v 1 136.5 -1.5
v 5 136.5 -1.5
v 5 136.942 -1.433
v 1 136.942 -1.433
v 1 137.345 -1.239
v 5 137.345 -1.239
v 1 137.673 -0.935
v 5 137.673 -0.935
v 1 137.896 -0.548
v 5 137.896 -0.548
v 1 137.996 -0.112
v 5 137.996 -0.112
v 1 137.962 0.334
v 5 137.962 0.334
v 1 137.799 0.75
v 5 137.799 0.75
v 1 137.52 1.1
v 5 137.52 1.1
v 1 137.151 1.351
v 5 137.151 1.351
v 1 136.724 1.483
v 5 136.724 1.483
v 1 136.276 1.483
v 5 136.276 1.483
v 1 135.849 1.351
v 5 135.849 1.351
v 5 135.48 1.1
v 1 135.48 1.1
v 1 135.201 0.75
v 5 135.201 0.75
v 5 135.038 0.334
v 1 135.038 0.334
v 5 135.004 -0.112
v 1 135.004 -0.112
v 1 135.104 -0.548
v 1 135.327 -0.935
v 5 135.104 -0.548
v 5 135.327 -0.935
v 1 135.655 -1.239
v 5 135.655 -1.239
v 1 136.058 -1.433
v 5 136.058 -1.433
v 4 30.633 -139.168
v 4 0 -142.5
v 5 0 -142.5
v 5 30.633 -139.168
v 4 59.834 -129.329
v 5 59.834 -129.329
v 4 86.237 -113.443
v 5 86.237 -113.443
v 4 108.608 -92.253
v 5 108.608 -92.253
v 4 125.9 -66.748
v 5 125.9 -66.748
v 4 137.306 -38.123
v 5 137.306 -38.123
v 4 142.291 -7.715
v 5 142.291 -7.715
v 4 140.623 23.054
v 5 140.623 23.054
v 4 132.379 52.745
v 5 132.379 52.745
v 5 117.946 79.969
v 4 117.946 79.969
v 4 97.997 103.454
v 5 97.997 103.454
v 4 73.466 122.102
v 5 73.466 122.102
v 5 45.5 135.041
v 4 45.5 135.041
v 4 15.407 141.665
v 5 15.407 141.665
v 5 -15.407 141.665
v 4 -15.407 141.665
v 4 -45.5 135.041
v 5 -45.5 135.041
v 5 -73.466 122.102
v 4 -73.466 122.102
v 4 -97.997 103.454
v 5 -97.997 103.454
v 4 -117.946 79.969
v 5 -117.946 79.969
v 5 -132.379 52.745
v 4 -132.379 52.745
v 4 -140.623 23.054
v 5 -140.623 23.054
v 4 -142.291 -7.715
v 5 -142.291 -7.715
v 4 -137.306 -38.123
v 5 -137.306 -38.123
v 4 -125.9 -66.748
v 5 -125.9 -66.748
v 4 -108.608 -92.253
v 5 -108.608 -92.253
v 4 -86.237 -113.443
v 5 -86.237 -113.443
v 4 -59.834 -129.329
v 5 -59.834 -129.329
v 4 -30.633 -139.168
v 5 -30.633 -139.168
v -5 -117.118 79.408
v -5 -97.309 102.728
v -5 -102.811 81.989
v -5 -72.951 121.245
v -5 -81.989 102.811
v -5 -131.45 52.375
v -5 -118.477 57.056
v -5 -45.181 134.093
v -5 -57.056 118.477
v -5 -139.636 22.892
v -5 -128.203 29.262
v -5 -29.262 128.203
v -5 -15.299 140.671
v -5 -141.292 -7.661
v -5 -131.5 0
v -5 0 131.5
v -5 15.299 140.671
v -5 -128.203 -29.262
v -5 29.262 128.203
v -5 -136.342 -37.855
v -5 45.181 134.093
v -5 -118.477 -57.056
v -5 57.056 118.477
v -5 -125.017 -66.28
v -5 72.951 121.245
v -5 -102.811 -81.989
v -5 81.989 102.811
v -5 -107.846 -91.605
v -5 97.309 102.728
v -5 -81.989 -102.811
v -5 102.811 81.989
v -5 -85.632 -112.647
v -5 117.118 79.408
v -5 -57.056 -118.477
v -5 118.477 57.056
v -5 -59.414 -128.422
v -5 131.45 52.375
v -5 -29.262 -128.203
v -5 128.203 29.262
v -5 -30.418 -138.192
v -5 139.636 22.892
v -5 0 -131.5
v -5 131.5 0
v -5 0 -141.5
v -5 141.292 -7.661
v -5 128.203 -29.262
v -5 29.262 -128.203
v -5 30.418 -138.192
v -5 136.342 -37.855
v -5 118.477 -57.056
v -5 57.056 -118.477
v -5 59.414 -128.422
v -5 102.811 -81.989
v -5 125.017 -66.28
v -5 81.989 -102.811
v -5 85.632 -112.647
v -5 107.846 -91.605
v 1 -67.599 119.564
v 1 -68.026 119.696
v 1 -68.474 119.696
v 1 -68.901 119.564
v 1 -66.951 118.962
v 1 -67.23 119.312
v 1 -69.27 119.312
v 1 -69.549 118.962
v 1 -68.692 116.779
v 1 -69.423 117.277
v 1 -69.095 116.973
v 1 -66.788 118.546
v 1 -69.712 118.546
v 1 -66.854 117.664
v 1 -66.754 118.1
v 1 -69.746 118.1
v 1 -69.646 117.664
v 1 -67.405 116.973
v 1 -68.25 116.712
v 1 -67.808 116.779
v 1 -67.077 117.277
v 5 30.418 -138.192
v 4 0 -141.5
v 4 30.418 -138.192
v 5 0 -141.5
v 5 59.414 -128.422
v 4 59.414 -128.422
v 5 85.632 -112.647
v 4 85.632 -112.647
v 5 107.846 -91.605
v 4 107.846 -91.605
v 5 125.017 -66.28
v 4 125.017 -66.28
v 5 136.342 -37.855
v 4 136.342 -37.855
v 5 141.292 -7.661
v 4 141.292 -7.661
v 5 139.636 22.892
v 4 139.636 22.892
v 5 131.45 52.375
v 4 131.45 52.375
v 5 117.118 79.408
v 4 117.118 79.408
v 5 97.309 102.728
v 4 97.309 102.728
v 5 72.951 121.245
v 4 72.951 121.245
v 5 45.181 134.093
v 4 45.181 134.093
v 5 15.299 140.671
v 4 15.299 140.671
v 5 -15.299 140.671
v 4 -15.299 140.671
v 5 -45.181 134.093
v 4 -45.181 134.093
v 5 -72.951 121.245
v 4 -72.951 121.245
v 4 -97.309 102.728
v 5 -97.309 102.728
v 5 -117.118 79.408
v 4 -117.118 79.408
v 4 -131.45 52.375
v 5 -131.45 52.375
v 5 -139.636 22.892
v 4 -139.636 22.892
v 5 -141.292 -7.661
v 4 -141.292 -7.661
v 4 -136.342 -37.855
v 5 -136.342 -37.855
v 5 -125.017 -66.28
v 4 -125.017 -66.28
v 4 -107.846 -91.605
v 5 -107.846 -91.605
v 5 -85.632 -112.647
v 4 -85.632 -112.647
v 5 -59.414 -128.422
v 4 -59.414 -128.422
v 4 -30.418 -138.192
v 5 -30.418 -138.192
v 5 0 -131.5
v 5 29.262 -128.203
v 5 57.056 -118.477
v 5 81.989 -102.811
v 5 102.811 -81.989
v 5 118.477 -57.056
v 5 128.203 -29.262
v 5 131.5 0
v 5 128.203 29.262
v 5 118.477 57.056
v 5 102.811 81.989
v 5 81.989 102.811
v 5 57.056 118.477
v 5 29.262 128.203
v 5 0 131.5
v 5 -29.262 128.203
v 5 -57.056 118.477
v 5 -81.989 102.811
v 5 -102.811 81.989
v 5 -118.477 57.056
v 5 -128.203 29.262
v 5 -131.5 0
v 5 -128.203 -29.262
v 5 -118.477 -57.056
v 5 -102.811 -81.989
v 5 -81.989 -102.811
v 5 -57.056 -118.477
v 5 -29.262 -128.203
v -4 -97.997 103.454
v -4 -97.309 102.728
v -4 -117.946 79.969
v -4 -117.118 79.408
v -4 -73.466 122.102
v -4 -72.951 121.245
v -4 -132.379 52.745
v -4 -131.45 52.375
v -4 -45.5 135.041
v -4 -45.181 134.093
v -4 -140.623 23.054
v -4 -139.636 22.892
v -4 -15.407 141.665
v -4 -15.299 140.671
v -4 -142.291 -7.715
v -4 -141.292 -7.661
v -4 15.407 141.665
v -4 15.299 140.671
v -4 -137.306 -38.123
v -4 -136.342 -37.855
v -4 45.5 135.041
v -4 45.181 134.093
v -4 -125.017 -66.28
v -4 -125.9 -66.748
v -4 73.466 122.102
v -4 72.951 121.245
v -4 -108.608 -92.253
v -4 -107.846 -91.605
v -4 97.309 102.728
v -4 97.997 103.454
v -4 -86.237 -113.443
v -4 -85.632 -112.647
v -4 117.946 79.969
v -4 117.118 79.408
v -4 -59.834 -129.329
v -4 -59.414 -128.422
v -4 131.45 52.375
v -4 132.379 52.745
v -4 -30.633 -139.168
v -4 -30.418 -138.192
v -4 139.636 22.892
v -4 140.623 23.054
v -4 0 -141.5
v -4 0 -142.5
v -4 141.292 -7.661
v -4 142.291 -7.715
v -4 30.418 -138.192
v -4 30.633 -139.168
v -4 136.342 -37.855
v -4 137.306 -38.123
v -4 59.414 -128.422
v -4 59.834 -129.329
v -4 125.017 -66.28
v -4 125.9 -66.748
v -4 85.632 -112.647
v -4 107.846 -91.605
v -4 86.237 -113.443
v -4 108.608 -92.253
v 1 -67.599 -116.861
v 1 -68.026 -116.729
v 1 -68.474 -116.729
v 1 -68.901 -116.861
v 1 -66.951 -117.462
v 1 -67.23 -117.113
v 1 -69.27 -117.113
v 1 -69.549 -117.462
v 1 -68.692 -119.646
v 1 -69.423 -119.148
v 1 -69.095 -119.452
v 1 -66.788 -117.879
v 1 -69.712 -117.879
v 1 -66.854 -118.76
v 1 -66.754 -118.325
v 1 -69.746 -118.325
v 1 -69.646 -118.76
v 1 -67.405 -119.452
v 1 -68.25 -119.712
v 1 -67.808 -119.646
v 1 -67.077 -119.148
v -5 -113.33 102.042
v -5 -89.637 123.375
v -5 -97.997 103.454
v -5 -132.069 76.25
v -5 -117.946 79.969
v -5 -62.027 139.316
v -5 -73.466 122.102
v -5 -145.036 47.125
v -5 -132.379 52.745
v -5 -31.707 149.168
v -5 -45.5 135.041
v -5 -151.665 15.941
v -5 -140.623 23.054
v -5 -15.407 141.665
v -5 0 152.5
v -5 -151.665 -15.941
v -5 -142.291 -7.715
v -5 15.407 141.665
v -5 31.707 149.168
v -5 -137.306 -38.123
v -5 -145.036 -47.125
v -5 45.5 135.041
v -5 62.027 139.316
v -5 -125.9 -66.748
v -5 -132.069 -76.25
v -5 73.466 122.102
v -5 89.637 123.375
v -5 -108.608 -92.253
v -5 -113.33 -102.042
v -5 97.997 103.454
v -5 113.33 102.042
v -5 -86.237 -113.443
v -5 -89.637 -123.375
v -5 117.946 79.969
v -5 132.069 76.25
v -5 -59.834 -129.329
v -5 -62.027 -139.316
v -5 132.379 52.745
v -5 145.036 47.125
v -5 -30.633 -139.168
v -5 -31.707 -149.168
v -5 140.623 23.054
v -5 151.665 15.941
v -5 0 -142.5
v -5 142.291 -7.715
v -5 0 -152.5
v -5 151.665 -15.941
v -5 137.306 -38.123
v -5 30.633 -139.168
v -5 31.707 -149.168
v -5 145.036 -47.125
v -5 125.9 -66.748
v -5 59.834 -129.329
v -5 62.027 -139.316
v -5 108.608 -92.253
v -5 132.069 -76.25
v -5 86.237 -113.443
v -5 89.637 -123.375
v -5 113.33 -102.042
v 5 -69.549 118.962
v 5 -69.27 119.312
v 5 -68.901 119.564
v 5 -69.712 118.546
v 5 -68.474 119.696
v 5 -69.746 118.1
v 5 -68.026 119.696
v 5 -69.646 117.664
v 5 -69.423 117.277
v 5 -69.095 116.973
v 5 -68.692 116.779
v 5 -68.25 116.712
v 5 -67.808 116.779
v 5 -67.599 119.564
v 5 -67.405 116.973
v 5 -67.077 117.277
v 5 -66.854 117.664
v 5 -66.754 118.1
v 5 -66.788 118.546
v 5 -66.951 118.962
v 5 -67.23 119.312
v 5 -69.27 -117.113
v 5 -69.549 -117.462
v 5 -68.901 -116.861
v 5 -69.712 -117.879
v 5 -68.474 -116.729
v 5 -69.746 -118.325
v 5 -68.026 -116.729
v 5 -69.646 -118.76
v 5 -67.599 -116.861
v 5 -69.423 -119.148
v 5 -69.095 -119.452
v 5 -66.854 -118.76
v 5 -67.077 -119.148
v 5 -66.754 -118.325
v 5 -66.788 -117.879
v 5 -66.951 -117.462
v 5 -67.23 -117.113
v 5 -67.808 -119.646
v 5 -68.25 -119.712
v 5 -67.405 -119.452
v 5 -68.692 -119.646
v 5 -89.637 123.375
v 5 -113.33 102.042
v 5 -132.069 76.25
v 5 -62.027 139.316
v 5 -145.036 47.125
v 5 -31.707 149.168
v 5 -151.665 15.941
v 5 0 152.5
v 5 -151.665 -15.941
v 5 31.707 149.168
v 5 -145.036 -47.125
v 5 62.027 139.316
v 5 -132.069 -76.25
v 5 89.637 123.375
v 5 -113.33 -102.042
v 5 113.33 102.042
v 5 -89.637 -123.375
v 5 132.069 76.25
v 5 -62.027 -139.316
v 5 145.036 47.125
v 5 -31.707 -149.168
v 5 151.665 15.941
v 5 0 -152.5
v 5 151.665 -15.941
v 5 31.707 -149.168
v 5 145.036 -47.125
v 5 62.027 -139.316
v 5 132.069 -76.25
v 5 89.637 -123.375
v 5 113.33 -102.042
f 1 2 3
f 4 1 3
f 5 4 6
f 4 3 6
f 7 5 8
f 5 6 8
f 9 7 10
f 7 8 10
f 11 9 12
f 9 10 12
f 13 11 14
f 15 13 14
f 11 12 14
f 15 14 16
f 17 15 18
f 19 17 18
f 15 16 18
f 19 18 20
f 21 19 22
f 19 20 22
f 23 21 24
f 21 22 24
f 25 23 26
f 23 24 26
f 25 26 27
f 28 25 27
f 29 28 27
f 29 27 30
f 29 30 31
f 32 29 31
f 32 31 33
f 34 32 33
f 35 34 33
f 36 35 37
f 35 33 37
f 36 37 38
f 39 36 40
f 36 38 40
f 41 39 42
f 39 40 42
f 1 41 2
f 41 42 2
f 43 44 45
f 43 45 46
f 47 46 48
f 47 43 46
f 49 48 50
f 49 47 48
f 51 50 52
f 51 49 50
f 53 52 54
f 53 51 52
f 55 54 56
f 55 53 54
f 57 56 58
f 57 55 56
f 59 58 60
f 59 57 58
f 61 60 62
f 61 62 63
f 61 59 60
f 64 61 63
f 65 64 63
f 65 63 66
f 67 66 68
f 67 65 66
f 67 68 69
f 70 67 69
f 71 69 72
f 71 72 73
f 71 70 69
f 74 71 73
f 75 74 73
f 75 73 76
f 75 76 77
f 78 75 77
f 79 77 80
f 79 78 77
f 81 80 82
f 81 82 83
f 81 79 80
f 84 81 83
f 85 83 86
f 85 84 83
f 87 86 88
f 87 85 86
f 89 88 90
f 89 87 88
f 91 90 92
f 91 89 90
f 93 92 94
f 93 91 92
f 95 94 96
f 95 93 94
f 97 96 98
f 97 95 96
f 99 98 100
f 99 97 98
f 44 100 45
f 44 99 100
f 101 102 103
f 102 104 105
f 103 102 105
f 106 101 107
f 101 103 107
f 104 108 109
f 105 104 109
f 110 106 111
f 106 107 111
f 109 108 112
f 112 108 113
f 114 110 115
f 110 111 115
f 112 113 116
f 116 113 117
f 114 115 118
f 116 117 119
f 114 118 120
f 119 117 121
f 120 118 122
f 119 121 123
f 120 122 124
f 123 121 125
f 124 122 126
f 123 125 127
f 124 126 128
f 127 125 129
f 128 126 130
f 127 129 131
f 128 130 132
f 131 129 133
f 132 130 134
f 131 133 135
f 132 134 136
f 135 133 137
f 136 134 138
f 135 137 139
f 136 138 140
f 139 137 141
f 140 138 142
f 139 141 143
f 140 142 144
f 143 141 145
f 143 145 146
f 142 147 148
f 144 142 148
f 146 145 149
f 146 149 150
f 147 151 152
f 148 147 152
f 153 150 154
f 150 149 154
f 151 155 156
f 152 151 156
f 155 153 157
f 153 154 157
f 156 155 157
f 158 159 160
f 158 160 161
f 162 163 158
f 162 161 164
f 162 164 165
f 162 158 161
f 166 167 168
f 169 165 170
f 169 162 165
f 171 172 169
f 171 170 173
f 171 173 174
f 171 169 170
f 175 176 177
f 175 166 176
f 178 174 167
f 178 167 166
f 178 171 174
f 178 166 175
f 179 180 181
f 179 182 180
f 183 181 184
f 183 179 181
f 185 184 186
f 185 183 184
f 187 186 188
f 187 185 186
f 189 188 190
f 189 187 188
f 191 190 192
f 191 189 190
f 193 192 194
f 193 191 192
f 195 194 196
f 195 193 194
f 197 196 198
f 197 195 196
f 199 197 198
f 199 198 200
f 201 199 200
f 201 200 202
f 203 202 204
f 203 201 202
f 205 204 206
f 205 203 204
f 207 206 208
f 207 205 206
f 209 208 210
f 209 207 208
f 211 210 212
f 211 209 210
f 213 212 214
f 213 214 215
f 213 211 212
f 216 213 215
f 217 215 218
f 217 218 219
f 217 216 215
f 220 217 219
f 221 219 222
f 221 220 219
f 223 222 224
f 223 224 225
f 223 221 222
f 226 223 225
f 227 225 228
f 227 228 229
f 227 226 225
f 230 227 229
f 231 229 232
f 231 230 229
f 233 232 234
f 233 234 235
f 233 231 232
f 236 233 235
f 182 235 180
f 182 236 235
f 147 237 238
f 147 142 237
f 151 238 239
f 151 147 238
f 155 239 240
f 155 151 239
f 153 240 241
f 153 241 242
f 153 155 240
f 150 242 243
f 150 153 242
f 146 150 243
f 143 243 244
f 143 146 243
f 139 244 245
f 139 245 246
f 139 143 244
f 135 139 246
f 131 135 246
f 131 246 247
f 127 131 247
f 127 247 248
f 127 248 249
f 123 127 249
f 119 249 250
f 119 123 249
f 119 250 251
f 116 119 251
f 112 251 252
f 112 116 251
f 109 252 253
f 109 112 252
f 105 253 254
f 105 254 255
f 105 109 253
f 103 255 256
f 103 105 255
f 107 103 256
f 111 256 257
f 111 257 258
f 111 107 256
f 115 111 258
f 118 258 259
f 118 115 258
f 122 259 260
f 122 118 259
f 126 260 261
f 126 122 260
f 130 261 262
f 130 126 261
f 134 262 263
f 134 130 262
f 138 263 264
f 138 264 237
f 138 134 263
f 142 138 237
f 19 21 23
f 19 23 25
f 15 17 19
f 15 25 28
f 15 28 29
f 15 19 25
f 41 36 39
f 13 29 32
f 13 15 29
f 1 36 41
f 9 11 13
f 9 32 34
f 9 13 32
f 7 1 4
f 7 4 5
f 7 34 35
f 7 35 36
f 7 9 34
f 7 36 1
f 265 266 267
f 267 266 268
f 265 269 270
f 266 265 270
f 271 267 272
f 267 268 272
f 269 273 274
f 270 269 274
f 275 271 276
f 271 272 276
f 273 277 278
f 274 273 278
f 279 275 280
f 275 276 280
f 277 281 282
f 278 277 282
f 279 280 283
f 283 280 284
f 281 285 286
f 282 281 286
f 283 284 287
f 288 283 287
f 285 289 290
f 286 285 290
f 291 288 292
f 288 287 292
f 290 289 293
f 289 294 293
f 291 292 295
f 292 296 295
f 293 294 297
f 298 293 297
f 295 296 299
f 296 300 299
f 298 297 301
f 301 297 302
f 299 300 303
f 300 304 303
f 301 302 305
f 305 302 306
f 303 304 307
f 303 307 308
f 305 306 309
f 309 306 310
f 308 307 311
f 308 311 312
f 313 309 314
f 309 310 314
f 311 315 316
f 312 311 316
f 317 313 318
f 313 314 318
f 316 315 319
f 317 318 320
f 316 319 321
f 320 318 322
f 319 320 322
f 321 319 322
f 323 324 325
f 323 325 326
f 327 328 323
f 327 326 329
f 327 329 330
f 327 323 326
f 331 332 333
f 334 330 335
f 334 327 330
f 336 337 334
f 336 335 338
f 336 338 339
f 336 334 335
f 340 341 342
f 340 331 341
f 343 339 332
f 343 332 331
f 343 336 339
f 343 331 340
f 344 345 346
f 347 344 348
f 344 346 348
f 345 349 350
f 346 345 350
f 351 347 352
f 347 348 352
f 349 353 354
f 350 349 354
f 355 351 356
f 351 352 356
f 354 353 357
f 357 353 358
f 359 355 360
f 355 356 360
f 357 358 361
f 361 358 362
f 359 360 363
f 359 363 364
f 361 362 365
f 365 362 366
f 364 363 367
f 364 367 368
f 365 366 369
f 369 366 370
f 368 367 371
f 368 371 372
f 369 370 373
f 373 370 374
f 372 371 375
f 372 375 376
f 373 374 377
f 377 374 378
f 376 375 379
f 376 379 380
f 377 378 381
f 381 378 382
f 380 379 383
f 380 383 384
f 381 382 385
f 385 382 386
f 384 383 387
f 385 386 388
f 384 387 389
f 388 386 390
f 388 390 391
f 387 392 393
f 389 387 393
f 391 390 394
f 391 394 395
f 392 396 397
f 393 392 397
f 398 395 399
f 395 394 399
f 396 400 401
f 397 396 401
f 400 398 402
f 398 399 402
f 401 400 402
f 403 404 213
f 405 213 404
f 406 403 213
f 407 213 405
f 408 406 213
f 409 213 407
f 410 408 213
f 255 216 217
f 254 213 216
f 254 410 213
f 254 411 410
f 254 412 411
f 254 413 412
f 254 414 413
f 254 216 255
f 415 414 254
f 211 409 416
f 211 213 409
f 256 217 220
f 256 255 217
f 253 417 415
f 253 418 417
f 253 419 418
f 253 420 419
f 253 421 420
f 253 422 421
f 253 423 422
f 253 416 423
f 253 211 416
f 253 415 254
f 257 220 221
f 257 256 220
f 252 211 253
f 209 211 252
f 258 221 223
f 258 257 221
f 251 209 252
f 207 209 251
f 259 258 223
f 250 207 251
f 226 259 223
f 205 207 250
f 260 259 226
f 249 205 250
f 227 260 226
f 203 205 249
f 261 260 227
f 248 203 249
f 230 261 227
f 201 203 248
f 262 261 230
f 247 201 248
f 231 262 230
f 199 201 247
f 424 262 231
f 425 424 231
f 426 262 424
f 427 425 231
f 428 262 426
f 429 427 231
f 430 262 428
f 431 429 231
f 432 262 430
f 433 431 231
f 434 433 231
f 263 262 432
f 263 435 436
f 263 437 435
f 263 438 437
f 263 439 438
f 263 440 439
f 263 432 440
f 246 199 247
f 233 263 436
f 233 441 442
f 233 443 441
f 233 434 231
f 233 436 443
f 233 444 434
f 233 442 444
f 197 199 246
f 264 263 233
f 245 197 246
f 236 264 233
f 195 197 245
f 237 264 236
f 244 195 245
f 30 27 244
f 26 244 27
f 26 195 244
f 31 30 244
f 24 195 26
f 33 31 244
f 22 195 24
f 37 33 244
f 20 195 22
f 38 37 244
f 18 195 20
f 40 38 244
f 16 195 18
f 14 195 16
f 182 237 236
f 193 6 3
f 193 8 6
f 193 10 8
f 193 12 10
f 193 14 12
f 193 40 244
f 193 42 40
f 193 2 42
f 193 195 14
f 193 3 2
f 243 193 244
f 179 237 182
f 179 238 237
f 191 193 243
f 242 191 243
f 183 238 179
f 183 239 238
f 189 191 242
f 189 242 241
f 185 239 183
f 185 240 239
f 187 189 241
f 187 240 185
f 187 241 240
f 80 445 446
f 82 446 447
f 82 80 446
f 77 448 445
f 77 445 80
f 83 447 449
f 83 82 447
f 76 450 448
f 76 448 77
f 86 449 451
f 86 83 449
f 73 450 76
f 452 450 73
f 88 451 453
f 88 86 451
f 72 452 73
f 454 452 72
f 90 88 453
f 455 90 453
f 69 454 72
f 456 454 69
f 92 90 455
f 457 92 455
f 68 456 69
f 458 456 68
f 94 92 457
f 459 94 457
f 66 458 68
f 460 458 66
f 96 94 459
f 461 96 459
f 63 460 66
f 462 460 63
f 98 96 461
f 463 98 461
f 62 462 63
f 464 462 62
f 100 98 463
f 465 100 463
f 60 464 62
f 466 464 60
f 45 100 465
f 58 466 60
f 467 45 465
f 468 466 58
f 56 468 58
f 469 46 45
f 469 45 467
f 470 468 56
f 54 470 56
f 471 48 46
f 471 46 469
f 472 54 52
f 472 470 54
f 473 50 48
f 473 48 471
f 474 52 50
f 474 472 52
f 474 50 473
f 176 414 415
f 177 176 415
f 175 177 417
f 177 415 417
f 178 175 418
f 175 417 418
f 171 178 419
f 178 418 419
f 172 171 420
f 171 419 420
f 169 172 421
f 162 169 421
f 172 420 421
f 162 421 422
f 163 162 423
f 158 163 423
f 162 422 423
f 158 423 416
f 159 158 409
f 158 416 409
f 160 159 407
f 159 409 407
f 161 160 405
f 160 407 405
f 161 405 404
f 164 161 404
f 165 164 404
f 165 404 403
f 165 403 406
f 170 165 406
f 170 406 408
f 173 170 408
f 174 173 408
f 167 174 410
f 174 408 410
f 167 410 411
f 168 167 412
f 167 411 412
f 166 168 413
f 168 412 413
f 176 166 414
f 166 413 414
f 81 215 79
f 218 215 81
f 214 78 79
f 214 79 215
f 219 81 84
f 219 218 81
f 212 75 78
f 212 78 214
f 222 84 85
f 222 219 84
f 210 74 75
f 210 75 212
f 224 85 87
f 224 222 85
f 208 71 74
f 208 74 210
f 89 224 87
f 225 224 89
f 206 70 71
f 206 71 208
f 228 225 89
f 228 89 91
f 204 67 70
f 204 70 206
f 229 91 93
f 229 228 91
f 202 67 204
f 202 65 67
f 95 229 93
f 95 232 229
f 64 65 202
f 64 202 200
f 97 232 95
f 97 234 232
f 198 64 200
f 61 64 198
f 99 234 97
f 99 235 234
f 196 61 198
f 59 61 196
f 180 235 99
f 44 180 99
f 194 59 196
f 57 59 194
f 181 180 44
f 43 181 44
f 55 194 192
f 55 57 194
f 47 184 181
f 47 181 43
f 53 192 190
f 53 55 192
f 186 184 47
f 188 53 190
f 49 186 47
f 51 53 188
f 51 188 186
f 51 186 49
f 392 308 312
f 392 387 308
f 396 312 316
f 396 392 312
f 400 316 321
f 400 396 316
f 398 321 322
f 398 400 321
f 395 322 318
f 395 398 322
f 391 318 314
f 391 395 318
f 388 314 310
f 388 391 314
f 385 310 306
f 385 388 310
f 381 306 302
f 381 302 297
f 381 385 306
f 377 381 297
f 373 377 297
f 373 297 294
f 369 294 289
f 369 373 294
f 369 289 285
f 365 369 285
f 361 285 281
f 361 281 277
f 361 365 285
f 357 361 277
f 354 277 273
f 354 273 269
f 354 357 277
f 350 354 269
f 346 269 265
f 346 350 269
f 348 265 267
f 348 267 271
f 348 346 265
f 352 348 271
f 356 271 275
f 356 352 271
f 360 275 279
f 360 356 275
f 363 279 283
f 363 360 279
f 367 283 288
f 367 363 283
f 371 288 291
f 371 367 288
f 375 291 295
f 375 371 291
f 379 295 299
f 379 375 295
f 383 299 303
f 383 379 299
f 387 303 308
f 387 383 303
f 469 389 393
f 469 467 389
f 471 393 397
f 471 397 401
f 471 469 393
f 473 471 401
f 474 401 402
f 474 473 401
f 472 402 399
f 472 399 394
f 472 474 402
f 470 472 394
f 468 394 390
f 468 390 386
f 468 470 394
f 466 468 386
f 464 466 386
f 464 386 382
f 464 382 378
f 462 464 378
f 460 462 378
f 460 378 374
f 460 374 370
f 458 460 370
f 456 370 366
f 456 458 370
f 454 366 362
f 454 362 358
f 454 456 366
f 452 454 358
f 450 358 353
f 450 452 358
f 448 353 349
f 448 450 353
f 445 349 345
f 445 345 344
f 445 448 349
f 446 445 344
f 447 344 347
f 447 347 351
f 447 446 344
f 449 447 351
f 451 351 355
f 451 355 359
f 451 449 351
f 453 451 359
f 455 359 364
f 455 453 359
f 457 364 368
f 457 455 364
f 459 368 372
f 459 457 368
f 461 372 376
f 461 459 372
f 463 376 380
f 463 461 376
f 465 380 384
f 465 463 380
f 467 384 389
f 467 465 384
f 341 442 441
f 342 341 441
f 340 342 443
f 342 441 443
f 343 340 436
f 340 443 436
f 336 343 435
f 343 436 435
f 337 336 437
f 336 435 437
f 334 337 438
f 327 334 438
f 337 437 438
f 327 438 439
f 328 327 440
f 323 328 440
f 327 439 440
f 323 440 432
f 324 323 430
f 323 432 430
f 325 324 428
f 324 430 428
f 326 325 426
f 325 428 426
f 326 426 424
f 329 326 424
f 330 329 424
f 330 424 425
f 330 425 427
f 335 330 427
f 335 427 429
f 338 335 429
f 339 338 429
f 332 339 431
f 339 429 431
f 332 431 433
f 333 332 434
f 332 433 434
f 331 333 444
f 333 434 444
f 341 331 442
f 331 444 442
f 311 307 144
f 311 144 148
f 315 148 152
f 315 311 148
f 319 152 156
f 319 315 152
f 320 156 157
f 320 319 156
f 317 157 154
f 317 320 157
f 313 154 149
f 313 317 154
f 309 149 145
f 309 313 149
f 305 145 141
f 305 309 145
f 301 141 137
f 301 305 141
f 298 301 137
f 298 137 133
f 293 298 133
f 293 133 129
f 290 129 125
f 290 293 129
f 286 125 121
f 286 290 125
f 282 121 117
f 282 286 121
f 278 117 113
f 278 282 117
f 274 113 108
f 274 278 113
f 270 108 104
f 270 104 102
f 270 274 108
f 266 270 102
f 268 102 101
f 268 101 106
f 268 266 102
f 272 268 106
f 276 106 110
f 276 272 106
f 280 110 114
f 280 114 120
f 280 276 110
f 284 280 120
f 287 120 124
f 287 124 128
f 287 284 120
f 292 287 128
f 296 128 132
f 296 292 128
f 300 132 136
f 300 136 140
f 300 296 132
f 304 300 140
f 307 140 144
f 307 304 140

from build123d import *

# Parameters (mm, degrees)
SKETCH1_R             = 152.5
SKETCH1_R_2           = 142.5
BOSS_EXTRUDE2_DEPTH   = 5
SKETCH1_R_3           = 141.5
SKETCH1_R_4           = 131.5
BOSS_EXTRUDE2_2_DEPTH = 5
SKETCH1_4_R           = 142.5
SKETCH1_4_R_2         = 141.5
BOSS_EXTRUDE3_DEPTH   = 4
SKETCH2_R             = 1.5
CUT_EXTRUDE1_DEPTH    = 4


with BuildPart() as part:
    # Sketch1 → Boss-Extrude2 (new, symmetric)
    with BuildSketch(Plane(origin=(0, 0, 0), x_dir=(0, 0, -1), z_dir=(1, 0, 0))):
        Circle(SKETCH1_R)
        Circle(SKETCH1_R_2, mode=Mode.SUBTRACT)
    extrude(amount=BOSS_EXTRUDE2_DEPTH, both=True)



with BuildPart() as body_2:
    # Sketch1 → Boss-Extrude2 2 (new, symmetric)
    with BuildSketch(Plane(origin=(0, 0, 0), x_dir=(0, 0, -1), z_dir=(1, 0, 0))):
        Circle(SKETCH1_R_3)
        Circle(SKETCH1_R_4, mode=Mode.SUBTRACT)
    extrude(amount=BOSS_EXTRUDE2_2_DEPTH, both=True)


with BuildPart() as part_1:
    add(part.part)

    add(body_2.part)  # Boss-Extrude3 merges body 2
    # Sketch1<4> → Boss-Extrude3 (add, symmetric)
    with BuildSketch(Plane(origin=(0, 0, 0), x_dir=(0, 0, -1), z_dir=(1, 0, 0))):
        Circle(SKETCH1_4_R)
        Circle(SKETCH1_4_R_2, mode=Mode.SUBTRACT)
    extrude(amount=BOSS_EXTRUDE3_DEPTH, both=True)

    # Sketch2 → Cut-Extrude1 (cut)
    with BuildSketch(Plane(origin=(5, 0, 0), x_dir=(0, 0, -1), z_dir=(1, 0, 0))):
        with Locations((0, 136.5)):
            Circle(SKETCH2_R)
        with Locations((118.212467617, -68.25)):
            Circle(SKETCH2_R)
        with Locations((-118.212467617, -68.25)):
            Circle(SKETCH2_R)
    extrude(amount=-CUT_EXTRUDE1_DEPTH, mode=Mode.SUBTRACT)


solid = part_1.part
